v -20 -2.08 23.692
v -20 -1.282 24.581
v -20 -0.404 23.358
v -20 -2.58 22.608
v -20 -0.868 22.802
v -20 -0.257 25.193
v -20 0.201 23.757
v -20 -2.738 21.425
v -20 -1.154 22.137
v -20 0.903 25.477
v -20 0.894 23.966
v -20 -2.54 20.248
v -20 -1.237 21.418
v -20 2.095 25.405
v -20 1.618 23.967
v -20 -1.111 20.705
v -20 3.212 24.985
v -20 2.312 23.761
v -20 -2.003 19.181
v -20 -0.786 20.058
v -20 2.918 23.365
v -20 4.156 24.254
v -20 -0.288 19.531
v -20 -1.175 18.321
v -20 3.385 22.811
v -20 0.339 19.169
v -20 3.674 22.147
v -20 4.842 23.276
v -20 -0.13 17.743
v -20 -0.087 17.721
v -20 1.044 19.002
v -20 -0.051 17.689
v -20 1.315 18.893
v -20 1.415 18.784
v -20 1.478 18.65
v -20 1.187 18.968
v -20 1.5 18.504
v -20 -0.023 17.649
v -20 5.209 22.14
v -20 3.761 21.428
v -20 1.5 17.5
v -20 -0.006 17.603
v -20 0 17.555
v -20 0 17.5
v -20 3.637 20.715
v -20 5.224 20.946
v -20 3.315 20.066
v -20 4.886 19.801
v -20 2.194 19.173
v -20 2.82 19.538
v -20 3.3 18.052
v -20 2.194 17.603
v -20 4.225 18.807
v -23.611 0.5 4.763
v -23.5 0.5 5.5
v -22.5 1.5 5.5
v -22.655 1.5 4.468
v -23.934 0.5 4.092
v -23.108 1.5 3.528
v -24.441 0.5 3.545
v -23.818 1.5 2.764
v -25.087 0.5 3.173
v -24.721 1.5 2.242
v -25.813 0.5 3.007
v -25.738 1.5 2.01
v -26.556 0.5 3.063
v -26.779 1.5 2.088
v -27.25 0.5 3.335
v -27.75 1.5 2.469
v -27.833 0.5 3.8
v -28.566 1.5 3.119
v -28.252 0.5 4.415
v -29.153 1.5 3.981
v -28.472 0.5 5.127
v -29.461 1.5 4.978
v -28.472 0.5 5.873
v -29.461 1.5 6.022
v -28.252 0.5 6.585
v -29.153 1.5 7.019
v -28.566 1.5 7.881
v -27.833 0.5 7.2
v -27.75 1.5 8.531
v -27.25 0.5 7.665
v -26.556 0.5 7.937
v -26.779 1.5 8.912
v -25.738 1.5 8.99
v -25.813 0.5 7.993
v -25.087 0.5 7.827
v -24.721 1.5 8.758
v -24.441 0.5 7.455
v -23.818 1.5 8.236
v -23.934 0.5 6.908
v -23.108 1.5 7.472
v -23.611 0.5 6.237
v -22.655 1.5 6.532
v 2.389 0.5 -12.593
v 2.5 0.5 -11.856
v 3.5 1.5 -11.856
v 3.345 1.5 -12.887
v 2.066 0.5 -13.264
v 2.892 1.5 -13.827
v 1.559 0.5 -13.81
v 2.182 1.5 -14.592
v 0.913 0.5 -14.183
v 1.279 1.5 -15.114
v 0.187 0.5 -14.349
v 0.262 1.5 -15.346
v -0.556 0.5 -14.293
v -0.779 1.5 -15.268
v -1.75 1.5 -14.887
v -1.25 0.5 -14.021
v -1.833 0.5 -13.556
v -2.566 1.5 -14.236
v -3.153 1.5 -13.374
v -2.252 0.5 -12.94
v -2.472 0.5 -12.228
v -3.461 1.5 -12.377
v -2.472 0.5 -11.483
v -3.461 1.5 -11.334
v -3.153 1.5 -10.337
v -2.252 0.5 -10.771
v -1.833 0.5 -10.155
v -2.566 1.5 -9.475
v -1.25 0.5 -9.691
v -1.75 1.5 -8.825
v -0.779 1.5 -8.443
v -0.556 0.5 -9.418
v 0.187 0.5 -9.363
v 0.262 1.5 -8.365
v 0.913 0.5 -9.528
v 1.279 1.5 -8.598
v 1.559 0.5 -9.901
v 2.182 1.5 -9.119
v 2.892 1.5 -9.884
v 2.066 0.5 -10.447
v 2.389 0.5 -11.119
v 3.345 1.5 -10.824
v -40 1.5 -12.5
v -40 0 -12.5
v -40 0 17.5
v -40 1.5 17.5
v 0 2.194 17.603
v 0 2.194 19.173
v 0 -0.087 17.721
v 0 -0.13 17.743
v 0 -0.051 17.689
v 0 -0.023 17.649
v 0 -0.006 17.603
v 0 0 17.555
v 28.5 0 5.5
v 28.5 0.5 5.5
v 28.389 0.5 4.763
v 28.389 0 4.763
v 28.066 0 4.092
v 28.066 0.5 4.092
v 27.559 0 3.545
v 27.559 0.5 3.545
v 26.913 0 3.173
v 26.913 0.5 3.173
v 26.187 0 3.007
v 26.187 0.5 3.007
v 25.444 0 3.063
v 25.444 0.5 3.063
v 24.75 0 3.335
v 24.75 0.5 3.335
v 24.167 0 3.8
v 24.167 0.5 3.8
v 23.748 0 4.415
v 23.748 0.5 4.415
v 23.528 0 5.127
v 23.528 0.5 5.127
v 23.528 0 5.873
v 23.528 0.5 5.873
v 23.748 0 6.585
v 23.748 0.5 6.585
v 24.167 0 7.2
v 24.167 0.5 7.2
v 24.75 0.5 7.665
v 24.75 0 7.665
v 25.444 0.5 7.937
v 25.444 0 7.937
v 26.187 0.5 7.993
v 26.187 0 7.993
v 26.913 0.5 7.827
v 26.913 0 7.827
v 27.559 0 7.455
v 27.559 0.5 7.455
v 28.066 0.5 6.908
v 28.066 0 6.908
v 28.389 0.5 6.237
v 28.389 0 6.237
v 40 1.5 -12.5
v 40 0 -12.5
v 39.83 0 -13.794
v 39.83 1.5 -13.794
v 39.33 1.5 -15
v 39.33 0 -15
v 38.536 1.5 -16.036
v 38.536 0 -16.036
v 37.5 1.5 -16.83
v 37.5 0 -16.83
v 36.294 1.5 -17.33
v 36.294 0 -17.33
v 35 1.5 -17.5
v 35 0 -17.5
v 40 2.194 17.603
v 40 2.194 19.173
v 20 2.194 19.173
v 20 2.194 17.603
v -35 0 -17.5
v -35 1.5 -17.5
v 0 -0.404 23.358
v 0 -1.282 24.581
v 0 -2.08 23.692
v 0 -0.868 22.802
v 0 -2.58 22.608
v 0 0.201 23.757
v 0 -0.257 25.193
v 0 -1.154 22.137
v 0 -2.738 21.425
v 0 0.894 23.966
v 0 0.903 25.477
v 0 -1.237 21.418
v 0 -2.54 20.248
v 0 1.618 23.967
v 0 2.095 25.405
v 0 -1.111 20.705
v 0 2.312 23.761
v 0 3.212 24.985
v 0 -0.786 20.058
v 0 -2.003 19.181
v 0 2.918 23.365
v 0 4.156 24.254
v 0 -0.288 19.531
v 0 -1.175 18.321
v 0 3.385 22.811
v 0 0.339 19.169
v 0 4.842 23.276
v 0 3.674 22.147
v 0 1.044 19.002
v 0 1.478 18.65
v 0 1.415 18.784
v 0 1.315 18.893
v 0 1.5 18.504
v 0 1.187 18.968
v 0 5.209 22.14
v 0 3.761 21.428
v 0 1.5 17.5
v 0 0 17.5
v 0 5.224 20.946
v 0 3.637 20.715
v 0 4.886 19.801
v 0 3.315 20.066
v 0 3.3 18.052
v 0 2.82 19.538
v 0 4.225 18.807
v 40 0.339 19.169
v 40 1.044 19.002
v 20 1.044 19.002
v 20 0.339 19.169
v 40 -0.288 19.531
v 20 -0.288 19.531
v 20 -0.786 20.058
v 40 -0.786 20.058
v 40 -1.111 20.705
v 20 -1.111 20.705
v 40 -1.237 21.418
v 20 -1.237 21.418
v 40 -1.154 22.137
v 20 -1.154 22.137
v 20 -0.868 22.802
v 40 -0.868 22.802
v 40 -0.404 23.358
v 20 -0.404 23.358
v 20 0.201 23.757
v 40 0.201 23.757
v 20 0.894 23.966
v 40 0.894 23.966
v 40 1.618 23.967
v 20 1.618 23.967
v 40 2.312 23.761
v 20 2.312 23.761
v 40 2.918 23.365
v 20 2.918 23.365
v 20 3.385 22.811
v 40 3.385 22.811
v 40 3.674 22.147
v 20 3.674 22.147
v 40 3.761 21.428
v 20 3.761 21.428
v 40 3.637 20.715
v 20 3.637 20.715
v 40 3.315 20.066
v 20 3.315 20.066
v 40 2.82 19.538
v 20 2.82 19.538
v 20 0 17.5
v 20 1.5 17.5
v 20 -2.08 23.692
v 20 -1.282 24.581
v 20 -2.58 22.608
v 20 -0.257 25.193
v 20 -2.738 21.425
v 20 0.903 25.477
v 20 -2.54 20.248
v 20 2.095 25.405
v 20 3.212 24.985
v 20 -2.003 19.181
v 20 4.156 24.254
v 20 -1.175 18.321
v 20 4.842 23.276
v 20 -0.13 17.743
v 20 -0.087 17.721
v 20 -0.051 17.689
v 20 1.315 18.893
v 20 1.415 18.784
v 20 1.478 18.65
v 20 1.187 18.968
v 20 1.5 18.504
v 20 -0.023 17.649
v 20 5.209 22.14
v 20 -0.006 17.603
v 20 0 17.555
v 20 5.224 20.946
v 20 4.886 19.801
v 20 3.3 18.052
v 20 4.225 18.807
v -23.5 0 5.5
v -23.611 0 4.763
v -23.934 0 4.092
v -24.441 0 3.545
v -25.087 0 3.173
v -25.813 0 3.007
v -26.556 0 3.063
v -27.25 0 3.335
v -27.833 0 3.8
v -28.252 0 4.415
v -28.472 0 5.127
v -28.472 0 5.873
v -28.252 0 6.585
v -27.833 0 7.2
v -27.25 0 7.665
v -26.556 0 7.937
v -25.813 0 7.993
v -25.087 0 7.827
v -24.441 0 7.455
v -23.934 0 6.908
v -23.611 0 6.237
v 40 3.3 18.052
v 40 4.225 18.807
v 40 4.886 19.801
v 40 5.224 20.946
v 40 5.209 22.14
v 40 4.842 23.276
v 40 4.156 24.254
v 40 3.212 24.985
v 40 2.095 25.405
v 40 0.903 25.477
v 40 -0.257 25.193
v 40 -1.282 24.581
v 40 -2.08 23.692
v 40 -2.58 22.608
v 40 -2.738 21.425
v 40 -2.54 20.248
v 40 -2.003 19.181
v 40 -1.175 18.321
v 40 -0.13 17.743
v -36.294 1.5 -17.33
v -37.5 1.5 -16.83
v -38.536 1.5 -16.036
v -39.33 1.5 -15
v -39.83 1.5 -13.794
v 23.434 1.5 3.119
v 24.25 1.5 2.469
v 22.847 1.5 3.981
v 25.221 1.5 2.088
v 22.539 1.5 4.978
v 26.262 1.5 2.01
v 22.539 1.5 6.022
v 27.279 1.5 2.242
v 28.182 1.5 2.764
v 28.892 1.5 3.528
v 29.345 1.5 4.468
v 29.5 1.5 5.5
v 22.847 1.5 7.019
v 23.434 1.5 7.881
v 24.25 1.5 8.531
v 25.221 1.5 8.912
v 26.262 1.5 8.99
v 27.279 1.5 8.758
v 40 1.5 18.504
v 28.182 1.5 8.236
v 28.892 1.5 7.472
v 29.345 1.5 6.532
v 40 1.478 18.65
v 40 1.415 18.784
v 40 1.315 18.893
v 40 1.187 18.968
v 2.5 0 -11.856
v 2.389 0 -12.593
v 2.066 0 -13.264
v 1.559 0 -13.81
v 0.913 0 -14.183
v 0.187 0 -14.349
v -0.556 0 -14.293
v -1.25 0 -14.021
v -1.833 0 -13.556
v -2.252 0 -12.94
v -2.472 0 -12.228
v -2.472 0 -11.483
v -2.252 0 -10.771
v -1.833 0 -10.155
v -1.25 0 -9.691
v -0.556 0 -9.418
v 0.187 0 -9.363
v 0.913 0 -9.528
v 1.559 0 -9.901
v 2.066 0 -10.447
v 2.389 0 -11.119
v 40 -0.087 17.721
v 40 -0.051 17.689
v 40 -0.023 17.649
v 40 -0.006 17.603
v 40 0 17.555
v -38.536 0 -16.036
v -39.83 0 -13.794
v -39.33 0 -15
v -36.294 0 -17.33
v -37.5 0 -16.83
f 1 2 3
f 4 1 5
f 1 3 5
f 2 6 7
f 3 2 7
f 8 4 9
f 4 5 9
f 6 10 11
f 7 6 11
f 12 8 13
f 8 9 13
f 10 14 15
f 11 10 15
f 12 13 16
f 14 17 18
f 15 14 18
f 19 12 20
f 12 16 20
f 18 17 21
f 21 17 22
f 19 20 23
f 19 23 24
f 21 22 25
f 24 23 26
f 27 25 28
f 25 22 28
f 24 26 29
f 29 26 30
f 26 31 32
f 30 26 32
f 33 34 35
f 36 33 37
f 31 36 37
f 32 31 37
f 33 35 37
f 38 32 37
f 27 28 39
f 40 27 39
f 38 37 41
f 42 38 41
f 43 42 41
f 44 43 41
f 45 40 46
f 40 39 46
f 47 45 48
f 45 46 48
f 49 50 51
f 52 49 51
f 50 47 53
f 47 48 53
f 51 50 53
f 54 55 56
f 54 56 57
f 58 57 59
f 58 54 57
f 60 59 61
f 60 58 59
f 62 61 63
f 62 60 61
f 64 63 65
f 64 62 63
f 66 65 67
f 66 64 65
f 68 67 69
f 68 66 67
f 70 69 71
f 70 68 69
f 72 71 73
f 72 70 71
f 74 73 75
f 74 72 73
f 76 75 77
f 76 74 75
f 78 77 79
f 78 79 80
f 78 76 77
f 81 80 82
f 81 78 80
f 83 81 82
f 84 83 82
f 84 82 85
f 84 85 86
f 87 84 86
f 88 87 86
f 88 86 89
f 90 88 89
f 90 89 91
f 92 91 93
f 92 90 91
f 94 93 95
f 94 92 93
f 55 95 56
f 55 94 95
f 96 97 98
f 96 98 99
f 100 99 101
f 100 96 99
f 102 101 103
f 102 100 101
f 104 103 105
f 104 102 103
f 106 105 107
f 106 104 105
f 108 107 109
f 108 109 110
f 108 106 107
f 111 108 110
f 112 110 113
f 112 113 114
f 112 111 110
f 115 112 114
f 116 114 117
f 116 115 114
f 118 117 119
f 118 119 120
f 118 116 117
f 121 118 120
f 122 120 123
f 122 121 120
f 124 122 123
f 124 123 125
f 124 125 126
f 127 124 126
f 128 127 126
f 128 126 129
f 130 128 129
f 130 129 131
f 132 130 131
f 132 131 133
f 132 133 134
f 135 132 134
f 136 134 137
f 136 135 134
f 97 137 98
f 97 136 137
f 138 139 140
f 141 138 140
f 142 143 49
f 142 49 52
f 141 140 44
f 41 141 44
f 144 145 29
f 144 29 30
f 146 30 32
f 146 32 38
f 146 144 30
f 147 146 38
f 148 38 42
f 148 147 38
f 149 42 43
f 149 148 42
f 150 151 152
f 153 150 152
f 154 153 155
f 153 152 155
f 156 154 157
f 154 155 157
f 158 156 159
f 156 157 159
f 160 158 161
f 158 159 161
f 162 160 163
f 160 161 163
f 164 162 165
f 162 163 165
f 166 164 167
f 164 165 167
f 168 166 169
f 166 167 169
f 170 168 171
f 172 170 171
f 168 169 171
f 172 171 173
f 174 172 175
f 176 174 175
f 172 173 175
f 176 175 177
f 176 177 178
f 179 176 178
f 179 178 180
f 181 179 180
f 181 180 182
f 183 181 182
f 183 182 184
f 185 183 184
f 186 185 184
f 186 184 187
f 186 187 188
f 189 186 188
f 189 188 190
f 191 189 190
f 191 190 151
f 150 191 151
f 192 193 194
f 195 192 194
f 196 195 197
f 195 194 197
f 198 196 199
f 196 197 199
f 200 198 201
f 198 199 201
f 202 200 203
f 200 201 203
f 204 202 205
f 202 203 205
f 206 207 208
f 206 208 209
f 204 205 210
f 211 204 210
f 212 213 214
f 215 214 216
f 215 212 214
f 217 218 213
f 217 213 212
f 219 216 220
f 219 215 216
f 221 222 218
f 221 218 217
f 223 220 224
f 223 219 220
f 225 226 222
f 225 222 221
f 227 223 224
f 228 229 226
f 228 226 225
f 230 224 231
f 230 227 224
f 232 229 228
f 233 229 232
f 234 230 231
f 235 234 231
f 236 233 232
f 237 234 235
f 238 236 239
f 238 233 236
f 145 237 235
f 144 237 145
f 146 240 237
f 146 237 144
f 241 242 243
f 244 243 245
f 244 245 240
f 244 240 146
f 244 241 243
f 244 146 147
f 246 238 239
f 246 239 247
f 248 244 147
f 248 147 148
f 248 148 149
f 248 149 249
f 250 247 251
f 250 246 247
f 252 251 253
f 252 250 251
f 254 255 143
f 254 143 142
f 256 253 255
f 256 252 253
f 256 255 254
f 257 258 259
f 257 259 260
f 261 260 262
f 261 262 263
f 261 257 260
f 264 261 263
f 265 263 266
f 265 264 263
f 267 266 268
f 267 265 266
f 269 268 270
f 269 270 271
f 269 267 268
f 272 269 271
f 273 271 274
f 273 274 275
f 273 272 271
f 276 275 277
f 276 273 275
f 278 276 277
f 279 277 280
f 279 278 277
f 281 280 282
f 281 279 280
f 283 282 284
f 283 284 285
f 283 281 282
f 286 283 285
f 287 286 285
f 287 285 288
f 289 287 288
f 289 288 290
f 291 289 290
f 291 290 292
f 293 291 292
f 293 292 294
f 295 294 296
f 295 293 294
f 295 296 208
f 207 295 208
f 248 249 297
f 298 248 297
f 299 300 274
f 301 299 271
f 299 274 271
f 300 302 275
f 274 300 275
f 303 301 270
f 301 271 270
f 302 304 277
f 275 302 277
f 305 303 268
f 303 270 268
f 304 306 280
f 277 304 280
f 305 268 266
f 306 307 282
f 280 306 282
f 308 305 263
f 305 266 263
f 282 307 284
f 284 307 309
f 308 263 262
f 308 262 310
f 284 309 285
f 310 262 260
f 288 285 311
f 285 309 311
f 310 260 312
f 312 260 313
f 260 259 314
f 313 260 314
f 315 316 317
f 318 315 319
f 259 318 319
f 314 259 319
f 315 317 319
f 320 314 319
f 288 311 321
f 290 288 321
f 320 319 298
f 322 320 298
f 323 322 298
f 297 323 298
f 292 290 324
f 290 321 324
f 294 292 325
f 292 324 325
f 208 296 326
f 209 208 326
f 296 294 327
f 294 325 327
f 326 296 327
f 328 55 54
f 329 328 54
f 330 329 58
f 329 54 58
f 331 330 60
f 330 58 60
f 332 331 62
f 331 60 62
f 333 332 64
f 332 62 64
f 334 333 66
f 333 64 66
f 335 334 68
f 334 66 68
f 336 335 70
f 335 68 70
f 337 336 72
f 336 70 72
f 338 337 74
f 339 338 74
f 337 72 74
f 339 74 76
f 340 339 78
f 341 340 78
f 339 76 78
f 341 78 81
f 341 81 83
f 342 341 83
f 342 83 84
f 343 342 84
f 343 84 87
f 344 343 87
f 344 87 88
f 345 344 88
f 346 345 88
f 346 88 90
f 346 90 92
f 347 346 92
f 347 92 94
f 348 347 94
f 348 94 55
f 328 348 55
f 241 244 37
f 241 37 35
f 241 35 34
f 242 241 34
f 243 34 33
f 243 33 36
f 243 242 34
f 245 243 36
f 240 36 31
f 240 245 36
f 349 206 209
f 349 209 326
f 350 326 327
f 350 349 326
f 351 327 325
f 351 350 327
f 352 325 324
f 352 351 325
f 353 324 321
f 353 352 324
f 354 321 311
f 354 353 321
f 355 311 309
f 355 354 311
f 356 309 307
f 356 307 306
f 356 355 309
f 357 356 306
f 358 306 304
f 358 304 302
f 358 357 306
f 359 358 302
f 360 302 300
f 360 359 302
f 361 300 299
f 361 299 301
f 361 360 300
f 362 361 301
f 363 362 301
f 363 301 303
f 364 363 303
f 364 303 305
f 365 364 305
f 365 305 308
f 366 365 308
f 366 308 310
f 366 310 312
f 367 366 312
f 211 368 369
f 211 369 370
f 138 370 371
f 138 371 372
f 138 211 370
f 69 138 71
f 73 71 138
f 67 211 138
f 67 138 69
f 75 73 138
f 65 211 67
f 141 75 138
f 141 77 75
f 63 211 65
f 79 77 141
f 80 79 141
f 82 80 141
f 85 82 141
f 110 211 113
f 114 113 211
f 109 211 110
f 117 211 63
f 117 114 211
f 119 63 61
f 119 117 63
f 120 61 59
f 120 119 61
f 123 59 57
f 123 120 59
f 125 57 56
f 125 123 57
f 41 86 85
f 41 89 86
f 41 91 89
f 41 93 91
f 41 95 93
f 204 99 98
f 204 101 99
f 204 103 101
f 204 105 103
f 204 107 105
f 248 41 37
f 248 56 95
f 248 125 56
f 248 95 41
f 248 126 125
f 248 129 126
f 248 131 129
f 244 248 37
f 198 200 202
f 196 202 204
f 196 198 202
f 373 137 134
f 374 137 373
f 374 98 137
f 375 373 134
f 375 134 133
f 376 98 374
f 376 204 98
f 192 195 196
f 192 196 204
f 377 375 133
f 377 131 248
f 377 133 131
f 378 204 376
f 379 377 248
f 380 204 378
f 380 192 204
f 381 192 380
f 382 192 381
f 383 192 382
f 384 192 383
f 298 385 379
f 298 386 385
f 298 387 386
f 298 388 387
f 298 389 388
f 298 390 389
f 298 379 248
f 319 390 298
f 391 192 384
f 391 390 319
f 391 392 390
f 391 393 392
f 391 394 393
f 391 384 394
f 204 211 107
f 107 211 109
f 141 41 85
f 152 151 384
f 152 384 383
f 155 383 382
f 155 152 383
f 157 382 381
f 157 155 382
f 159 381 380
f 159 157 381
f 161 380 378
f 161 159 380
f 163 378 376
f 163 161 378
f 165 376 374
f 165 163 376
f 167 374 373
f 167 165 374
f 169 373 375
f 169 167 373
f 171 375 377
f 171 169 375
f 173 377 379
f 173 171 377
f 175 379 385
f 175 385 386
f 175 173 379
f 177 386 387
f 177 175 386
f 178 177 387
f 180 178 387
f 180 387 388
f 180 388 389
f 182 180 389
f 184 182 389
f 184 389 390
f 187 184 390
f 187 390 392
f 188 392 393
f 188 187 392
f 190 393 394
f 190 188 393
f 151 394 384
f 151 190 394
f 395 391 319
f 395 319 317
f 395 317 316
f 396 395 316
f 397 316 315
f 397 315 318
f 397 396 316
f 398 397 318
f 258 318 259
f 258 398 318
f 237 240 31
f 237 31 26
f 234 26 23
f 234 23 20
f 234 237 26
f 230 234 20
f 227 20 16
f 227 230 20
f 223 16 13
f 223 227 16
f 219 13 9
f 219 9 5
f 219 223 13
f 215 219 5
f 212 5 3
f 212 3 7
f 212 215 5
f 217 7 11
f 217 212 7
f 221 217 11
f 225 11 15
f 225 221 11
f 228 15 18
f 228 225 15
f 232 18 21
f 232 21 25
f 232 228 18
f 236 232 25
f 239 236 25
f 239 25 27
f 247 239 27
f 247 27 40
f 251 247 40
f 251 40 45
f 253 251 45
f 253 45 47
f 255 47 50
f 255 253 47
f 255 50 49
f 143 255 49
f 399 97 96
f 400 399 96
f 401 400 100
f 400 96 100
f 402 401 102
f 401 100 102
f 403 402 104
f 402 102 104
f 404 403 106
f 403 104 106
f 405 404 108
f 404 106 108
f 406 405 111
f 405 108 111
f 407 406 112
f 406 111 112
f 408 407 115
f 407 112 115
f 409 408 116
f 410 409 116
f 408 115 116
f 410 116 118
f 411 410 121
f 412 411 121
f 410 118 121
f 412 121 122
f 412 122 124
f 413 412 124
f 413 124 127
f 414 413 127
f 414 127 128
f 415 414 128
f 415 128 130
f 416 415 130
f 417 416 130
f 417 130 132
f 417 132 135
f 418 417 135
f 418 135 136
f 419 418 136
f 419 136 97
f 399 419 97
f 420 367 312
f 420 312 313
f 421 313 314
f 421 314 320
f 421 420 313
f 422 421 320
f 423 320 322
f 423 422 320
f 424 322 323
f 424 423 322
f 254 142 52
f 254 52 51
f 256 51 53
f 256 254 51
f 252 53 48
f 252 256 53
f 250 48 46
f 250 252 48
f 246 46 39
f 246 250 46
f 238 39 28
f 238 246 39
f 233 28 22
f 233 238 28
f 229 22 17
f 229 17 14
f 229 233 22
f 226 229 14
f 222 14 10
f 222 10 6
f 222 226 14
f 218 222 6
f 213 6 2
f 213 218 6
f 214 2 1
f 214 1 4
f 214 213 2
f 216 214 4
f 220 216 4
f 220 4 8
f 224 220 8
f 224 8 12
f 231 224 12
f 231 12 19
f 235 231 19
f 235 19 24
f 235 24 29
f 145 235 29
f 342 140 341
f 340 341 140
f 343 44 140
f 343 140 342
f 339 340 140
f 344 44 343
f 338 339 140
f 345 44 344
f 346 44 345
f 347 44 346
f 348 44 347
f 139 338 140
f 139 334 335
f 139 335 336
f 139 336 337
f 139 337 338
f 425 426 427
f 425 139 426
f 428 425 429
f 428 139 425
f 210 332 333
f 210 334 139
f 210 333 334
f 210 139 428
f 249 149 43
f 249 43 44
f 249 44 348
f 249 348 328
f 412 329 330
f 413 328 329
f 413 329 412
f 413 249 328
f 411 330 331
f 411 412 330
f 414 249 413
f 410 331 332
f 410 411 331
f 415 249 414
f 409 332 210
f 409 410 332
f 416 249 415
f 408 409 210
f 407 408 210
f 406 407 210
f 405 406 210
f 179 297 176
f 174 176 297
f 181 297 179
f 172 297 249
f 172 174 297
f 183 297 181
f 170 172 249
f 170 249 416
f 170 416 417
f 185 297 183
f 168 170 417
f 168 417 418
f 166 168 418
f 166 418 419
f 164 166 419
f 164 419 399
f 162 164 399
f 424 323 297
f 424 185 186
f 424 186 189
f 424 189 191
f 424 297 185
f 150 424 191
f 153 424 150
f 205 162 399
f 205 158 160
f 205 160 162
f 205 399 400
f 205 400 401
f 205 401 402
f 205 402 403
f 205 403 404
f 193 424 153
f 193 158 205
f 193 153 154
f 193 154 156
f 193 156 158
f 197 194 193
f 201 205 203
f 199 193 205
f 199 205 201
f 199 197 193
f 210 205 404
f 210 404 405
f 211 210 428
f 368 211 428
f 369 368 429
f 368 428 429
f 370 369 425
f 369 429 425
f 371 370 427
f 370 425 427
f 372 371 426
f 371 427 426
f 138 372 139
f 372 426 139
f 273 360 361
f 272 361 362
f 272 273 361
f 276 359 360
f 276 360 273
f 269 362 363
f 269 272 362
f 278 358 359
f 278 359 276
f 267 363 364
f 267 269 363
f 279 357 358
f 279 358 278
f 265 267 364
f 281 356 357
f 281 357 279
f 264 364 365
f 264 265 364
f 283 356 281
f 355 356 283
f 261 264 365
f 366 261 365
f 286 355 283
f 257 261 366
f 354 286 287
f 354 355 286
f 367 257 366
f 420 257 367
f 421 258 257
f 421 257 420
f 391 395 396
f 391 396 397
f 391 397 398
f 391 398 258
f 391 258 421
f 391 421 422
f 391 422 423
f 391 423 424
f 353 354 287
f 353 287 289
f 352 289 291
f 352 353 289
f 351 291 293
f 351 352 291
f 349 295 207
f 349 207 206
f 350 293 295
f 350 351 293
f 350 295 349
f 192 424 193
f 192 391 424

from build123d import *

# Parameters (mm, degrees)
BOSS_EXTRUDE1_DEPTH = 1.5
BOSS_EXTRUDE2_DEPTH = 20
LPATTERN1_COUNT     = 2
LPATTERN1_PITCH     = 40
SKETCH3_R           = 2.5
CUT_EXTRUDE1_DEPTH  = 5.238595513
CHAMFER1_SIZE       = 1


with BuildPart() as part:
    # Sketch1 → Boss-Extrude1 (new body)
    with BuildSketch(Plane(origin=(0, 0, 0), x_dir=(1, 0, 0), z_dir=(0, 1, 0))):
        with BuildLine():
            Line((-40, -17.5), (40, -17.5))
            Line((40, -17.5), (40, 12.5))
            ThreePointArc((40, 12.5), (38.535533906, 16.035533906), (35, 17.5))
            Line((35, 17.5), (-35, 17.5))
            ThreePointArc((-35, 17.5), (-38.535533906, 16.035533906), (-40, 12.5))
            Line((-40, 12.5), (-40, -17.5))
        make_face()
    extrude(amount=BOSS_EXTRUDE1_DEPTH)

    # Sketch2 → Boss-Extrude2 (add)
    with BuildSketch(Plane(origin=(40, 0, 0), x_dir=(0, 0, -1), z_dir=(1, 0, 0))):
        with BuildLine():
            Line((-17.5, 1.5), (-18.504288099, 1.5))
            ThreePointArc((-18.504288099, 1.5), (-18.842087072, 1.368635123), (-19.002386363, 1.043567414))
            ThreePointArc((-19.002386363, 1.043567414), (-23.96573551, 0.894016186), (-19.173284523, 2.193867665))
            Line((-19.173284523, 2.193867665), (-17.603081746, 2.193867665))
            ThreePointArc((-17.603081746, 2.193867665), (-25.485667036, 1.501473584), (-17.742830435, -0.13040931))
            ThreePointArc((-17.742830435, -0.13040931), (-17.669524968, -0.035807829), (-17.555328072, 0))
            Line((-17.555328072, 0), (-17.5, 0))
            Line((-17.5, 0), (-17.5, 1.5))
        make_face()
    boss_extrude2 = extrude(amount=-BOSS_EXTRUDE2_DEPTH)

    # LPattern1: Boss-Extrude2 ×2
    with Locations(*[(-i * LPATTERN1_PITCH, 0, 0) for i in range(1, LPATTERN1_COUNT)]):
        add(boss_extrude2)

    # Sketch3 → Cut-Extrude1 (cut, through all)
    with BuildSketch(Plane(origin=(0, 1.5, 0), x_dir=(1, 0, 0), z_dir=(0, 1, 0))):
        with Locations((-26, -5.5)):
            Circle(SKETCH3_R)
        with Locations((26, -5.5)):
            Circle(SKETCH3_R)
        with Locations((0, 11.85566874)):
            Circle(SKETCH3_R)
    extrude(amount=-CUT_EXTRUDE1_DEPTH, mode=Mode.SUBTRACT)

    # Chamfer1
    chamfer1_edges = [part.edges().sort_by_distance(p)[0] for p in [
        (-28.5, 1.5, 5.5),
        (23.5, 1.5, 5.5),
        (-2.5, 1.5, -11.85566874),
    ]]
    chamfer(chamfer1_edges, length=CHAMFER1_SIZE)


solid = part.part
